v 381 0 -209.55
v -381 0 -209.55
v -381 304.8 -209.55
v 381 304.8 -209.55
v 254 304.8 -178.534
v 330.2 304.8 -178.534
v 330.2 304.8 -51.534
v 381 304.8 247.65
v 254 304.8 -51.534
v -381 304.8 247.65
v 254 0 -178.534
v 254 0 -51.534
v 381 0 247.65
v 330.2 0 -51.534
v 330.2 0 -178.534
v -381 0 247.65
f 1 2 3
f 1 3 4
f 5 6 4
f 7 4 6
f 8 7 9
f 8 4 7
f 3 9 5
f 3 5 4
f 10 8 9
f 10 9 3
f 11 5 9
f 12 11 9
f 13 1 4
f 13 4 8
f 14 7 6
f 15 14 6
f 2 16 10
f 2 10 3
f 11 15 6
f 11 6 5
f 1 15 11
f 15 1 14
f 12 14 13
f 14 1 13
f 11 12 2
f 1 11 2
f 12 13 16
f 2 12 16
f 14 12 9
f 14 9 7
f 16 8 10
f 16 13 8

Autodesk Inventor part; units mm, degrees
ref_plane "YZ Plane" through (0, 0, 0) normal (1, 0, 0) x (0, 1, 0)
sketch "Sketch1" plane through (0, 0, 0) normal (0, 1, 0) x (-1, 0, 0)
  line L0 (381, -209.55) -> (-381, -209.55)
  line L1 (-381, -209.55) -> (-381, 247.65)
  line L2 (-381, 247.65) -> (381, 247.65)
  line L3 (381, 247.65) -> (381, -209.55)
  point P0 (0, 0)
  dimension "d0" = 762
extrude "Extrusion1" add sketch "Sketch1" along normal blind 304.8
ref_plane "Work Plane1" through (0, 304.8, 0) normal (0, 1, 0) x (-1, 0, 0)
sketch "Sketch2" plane through (0, 304.8, 0) normal (0, 1, 0) x (-1, 0, 0)
  line L0 (-254, -51.5336) -> (-330.2, -51.5336)
  line L1 (-330.2, -51.5336) -> (-330.2, -178.5336)
  line L2 (-330.2, -178.5336) -> (-254, -178.5336)
  line L3 (-254, -178.5336) -> (-254, -51.5336)
  line L4 (-381, 247.65) -> (-381, -209.55) projected
  line L5 (381, 247.65) -> (-381, 247.65) projected
  point P0 (0, 0)
  dimension "d6" = 127
  dimension "d7" = 76.2
extrude "Extrusion2" cut sketch "Sketch2" against normal blind 304.8
ref_plane "Work Plane2" through (0, 0, -213.36) normal (0, 0, 1) x (1, 0, 0)
sketch "Sketch3" plane through (0, 0, -213.36) normal (0, 0, 1) x (1, 0, 0)
  point P0 (0, 0)
sketch "Sketch4" plane through (0, 0, -213.36) normal (0, 0, 1) x (1, 0, 0)
  line L0 (-123.0782, 274.0785) -> (124.5718, 274.0785) construction
  line L1 (124.5718, 274.0785) -> (124.5718, 26.4285) construction
  line L2 (124.5718, 26.4285) -> (-123.0782, 26.4285) construction
  line L3 (-123.0782, 26.4285) -> (-123.0782, 274.0785) construction
  point P0 (0, 0)
properties part number "Box"
